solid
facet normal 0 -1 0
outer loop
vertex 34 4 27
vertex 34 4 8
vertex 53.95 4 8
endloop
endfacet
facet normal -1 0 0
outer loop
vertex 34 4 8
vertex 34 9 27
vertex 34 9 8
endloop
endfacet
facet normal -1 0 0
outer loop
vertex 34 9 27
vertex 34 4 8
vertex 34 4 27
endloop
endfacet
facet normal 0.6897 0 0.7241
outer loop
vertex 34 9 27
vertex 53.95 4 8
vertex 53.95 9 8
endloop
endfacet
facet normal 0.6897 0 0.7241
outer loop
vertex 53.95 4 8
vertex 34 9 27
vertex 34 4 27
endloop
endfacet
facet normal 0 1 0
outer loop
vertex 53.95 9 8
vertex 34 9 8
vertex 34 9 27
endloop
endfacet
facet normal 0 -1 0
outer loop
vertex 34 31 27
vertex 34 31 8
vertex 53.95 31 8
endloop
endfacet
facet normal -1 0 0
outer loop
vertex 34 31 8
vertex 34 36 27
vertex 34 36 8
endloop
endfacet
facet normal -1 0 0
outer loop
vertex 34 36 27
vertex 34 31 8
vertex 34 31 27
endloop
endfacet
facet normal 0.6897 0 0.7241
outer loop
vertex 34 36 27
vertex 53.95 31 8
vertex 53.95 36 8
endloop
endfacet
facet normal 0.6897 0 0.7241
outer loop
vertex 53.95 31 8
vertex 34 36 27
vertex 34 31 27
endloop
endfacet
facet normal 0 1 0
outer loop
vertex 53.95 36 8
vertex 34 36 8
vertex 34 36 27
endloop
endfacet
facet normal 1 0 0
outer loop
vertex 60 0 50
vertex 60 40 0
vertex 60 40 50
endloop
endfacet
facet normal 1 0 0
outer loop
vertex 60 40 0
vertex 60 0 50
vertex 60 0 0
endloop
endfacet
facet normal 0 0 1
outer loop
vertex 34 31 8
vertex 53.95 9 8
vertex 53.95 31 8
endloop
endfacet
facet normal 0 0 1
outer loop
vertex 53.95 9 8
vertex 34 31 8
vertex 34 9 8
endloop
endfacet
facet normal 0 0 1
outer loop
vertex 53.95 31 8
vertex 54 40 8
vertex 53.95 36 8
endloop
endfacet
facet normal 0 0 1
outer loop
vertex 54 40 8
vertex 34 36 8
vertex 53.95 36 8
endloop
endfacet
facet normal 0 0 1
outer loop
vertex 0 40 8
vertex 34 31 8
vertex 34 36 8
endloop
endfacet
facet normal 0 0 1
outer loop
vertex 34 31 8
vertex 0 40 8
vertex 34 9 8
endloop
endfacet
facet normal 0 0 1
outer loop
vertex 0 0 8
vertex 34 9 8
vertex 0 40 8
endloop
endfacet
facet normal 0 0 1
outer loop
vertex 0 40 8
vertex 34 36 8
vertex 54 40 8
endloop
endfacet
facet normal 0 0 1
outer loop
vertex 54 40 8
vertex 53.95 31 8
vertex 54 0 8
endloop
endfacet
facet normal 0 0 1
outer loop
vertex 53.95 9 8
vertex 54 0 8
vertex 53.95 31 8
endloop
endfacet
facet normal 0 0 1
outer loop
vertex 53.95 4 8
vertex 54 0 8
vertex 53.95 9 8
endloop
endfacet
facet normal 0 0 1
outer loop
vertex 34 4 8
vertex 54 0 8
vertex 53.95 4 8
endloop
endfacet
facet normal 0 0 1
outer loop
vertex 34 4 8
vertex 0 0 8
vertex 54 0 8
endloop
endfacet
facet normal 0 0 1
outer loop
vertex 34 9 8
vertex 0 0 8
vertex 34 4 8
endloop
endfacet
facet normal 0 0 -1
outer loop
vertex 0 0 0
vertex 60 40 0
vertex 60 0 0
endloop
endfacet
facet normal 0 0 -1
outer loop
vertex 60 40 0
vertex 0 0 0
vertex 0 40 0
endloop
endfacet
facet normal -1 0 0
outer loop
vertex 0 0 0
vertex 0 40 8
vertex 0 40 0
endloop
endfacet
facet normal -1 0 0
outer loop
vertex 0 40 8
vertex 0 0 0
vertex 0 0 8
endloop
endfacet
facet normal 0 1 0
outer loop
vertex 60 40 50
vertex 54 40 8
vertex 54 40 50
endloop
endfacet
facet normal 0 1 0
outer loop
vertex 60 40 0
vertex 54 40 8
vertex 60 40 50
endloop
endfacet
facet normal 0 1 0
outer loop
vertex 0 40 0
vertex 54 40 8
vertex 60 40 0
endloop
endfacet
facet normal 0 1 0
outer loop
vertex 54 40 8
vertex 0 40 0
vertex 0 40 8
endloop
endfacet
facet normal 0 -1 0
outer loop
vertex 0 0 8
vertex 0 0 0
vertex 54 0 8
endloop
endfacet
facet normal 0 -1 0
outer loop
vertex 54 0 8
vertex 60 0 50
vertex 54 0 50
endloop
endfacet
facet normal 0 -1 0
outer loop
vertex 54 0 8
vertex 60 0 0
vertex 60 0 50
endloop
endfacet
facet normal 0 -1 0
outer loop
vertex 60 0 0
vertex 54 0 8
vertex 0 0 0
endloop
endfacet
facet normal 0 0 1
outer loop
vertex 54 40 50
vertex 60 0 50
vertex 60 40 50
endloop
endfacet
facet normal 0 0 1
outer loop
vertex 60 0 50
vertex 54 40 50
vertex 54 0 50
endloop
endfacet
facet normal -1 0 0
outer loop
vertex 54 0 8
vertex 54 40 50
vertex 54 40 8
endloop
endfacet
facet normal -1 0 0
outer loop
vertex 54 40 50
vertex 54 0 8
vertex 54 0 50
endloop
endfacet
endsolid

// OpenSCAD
$fn = 32;

// ----------------------------------------------------------------------
// Rib bracket: 2-gusset L bracket
// ----------------------------------------------------------------------

// --- parameters (mm) ---
base_l = 60;              // foot length, X
base_w = 40;              // foot width, Y
base_t = 8;               // foot thickness
plate_t = 6;              // upright plate thickness
plate_h = 50;             // overall height
gus_l = 20;               // gusset leg along the foot
gus_h = 20;               // gusset height
gus_t = 5;                // gusset thickness
gus_edge = 4;             // gusset margin from the foot edge
n_gus = 2;                // gusset count

gus_pitch = (base_w - 2 * gus_edge - gus_t) / (n_gus - 1);  // gusset pitch

union() {
  cube([base_l, base_w, base_t]);
  translate([base_l - plate_t, 0, base_t - 1])
    cube([plate_t, base_w, plate_h - base_t + 1]);
  for (i = [0 : n_gus - 1])
    translate([base_l - plate_t - gus_l, gus_edge + i * gus_pitch, base_t - 1])
      rotate([-90, 0, 0])
        linear_extrude(height = gus_t)
          polygon(points = [[0, 0], [gus_l + 1, 0], [0, -gus_h]]);
}
